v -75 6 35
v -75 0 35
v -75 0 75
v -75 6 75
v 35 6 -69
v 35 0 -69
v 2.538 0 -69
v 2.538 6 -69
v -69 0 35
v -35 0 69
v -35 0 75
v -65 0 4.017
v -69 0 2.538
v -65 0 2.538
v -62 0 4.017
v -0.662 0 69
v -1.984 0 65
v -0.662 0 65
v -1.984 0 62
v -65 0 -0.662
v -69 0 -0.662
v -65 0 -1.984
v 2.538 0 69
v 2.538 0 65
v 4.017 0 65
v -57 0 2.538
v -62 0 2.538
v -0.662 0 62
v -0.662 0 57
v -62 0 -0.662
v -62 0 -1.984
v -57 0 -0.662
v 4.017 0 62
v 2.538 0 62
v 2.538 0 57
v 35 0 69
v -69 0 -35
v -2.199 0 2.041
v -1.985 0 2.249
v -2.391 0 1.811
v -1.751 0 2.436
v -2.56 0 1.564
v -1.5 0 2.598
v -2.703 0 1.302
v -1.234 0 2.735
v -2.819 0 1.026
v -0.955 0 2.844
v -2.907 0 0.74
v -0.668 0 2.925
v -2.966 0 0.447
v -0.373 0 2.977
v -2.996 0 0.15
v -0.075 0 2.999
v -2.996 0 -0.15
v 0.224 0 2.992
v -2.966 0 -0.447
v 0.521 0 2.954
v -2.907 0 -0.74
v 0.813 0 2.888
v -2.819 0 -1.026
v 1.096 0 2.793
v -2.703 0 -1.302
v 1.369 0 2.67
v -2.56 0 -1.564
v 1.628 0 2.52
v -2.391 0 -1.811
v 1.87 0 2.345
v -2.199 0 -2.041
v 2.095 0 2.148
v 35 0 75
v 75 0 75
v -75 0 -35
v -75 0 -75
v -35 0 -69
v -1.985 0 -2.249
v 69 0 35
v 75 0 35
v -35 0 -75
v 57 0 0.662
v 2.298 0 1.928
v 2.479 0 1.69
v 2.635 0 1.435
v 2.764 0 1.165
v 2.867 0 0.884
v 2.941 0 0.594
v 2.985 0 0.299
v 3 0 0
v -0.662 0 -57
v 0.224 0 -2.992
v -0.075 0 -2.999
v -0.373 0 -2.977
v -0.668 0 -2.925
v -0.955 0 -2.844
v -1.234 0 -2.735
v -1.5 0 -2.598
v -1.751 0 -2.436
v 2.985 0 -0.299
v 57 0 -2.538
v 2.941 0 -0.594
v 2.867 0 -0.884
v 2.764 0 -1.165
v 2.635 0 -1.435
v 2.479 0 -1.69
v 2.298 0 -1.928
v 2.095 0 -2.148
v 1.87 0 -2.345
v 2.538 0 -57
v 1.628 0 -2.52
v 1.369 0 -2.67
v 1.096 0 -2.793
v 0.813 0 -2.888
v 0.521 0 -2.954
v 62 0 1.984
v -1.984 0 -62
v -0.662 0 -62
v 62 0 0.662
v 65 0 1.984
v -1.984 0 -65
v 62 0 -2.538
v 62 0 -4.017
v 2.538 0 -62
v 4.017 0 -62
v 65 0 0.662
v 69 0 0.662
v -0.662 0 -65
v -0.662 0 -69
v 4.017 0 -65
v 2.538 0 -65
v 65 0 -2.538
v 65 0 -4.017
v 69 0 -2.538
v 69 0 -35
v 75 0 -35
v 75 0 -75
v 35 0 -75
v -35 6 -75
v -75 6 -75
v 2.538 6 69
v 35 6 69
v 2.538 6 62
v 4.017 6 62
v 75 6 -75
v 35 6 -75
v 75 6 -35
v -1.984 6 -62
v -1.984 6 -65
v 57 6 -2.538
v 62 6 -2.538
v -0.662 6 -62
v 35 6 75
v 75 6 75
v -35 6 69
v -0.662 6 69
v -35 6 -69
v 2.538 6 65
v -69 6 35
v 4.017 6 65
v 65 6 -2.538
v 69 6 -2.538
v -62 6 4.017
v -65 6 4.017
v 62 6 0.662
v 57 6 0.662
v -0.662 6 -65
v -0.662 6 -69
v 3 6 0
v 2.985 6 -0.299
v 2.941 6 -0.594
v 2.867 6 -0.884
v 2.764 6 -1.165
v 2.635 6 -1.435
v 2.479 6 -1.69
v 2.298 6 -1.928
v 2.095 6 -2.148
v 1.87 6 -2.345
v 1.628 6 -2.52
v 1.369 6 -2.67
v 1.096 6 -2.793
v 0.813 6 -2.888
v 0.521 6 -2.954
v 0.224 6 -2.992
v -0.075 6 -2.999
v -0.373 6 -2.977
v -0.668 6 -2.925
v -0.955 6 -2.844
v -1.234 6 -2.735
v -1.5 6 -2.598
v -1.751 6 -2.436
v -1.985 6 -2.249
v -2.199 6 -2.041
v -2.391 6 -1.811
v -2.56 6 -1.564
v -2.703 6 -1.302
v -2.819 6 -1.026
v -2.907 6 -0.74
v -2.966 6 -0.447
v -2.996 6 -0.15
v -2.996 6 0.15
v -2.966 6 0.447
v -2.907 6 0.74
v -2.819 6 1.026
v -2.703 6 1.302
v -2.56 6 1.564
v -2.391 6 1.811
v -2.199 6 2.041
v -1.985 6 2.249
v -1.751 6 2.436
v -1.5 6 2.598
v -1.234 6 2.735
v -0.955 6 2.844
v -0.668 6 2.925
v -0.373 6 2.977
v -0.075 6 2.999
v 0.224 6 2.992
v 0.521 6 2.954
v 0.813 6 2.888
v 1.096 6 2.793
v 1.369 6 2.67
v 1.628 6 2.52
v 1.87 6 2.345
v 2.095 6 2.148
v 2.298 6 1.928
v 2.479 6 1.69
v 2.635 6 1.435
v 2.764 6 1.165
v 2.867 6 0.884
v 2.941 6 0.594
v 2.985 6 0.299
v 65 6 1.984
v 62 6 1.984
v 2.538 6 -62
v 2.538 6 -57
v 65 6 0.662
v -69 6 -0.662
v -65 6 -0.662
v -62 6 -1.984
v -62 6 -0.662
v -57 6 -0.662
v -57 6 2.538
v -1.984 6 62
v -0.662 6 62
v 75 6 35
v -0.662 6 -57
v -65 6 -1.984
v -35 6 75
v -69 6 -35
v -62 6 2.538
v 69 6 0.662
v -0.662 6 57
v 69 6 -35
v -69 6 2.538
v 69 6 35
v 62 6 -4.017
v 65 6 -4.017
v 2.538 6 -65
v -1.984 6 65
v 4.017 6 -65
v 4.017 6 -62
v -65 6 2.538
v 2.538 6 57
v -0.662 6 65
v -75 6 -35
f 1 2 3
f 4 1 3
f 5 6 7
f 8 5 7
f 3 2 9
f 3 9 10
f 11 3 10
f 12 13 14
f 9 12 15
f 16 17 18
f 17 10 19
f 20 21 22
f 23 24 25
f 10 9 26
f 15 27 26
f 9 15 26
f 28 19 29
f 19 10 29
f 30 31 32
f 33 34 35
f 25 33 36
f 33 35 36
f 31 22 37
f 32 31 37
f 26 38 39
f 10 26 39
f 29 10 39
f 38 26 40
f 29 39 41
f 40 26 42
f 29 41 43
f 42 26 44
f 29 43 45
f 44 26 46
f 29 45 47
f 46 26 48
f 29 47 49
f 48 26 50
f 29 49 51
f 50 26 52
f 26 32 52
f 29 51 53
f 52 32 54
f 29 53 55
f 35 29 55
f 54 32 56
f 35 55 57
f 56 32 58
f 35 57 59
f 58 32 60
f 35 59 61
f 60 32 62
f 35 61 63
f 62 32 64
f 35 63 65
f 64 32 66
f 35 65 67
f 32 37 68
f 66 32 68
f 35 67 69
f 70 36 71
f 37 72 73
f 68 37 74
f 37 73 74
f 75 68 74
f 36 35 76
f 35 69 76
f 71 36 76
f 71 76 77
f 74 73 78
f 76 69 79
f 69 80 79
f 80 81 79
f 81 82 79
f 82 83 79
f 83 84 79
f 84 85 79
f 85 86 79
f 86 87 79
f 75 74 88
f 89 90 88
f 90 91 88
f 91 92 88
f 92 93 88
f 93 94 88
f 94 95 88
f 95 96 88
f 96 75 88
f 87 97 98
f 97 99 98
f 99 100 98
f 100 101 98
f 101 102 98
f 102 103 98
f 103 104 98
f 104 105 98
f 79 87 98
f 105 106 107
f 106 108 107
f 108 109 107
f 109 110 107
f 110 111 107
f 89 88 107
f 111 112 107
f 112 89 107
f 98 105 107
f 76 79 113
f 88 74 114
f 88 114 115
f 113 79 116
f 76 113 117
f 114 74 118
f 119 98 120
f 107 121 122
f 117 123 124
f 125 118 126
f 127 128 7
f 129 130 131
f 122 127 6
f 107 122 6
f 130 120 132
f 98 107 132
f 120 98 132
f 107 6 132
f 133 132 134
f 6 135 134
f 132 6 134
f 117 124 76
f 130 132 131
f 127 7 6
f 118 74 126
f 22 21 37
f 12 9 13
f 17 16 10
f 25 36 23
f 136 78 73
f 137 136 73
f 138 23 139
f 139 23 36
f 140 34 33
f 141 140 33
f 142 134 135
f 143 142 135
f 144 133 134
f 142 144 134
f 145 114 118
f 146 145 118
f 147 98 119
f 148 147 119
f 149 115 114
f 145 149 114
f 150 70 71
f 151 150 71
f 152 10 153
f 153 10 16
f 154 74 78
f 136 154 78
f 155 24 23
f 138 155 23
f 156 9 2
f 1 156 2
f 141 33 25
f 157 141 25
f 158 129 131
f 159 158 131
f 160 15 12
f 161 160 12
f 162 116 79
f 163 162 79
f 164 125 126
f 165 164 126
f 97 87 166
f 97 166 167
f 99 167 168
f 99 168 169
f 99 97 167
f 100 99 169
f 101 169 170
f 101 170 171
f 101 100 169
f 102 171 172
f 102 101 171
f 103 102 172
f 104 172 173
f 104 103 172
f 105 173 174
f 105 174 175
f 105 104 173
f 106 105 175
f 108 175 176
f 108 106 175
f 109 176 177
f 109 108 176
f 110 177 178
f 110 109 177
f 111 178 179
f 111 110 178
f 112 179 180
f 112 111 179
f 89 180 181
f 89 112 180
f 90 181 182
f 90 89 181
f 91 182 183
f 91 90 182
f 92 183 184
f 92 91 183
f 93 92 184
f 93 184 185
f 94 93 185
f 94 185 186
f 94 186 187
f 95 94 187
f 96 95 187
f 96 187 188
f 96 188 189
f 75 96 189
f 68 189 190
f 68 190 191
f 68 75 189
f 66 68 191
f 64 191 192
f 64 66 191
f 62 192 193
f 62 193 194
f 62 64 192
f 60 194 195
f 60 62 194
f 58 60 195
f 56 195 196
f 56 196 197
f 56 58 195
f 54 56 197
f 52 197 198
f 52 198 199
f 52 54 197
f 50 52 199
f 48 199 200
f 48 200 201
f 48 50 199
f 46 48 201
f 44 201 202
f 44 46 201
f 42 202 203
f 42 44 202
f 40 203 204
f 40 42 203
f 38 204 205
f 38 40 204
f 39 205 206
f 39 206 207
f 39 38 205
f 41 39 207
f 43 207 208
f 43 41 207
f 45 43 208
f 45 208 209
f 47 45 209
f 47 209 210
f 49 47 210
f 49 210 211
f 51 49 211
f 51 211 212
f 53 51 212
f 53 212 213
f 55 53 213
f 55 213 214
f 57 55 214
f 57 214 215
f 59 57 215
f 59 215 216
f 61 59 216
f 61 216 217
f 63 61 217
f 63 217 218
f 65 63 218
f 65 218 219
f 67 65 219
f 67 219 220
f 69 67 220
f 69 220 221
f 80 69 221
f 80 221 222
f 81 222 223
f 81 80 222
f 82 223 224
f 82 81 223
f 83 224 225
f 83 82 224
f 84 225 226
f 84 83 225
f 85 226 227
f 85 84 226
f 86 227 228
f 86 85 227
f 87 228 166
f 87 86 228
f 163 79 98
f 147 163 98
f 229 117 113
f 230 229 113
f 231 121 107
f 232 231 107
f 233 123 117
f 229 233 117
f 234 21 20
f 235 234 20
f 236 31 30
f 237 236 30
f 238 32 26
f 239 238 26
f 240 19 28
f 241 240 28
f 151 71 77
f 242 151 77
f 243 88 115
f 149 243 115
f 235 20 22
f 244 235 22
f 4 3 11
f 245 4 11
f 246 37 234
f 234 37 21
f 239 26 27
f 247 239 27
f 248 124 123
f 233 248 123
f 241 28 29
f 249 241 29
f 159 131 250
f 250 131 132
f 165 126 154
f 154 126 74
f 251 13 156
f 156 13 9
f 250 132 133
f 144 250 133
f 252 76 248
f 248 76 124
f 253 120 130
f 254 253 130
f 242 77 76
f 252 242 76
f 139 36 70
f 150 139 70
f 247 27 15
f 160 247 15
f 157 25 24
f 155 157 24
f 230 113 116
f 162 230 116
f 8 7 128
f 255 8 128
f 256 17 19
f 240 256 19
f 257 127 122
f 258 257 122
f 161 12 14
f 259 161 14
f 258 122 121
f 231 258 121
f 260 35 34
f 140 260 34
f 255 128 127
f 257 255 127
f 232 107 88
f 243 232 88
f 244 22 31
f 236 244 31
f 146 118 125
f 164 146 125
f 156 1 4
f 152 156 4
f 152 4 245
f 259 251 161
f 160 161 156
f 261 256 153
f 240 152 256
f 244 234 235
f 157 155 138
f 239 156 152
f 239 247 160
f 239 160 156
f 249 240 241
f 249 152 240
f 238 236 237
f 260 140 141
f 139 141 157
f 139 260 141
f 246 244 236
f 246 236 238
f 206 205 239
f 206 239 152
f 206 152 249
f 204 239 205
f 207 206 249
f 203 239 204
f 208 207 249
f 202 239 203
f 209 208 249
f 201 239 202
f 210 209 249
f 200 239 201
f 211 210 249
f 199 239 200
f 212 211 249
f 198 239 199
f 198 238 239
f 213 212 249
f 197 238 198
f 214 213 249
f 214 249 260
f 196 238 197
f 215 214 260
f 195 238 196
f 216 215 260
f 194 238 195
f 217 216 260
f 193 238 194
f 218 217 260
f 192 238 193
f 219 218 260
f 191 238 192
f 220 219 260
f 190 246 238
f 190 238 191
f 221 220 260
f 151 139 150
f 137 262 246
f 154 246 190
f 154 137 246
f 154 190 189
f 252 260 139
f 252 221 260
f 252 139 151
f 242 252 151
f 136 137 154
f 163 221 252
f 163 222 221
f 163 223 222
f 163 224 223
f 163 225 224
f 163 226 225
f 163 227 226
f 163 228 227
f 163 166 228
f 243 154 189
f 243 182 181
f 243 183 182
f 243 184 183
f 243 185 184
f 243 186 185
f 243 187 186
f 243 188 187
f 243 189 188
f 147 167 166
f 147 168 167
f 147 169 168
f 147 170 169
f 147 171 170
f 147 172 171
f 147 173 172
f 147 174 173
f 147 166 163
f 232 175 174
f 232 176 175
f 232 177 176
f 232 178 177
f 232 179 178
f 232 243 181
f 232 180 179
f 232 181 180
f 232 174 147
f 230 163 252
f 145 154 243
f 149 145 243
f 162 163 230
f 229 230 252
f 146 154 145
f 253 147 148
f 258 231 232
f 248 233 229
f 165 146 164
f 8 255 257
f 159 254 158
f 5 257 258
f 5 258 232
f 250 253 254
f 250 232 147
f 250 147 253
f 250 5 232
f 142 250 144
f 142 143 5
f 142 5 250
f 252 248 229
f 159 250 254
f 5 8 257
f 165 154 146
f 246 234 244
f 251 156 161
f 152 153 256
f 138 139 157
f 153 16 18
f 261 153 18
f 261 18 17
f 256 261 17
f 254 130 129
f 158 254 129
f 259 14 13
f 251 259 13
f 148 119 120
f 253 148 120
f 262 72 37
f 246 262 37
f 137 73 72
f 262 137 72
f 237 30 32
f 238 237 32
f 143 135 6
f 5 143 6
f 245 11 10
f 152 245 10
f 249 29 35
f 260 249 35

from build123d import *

# Parameters (mm, degrees)
SKETCH1_R           = 3
BOSS_EXTRUDE1_DEPTH = 6


with BuildPart() as part:
    # Sketch1 → Boss-Extrude1 (new body)
    with BuildSketch(Plane(origin=(0, 0, 0), x_dir=(1, 0, 0), z_dir=(0, 1, 0))):
        Polygon((75, -35), (69, -35), (69, -0.661610306), (65, -0.661610306), (65, -1.98375967), (62, -1.98375967), (62, -0.661610306), (57, -0.661610306), (57, 2.538389694), (62, 2.538389694), (62, 4.016764367), (65, 4.016764367), (65, 2.538389694), (69, 2.538389694), (69, 35), (75, 35), (75, 75), (35, 75), (35, 69), (2.538389694, 69), (2.538389694, 65), (4.016764367, 65), (4.016764367, 62), (2.538389694, 62), (2.538389694, 57), (-0.661610306, 57), (-0.661610306, 62), (-1.98375967, 62), (-1.98375967, 65), (-0.661610306, 65), (-0.661610306, 69), (-35, 69), (-35, 75), (-75, 75), (-75, 35), (-69, 35), (-69, 0.661610306), (-65, 0.661610306), (-65, 1.98375967), (-62, 1.98375967), (-62, 0.661610306), (-57, 0.661610306), (-57, -2.538389694), (-62, -2.538389694), (-62, -4.016764367), (-65, -4.016764367), (-65, -2.538389694), (-69, -2.538389694), (-69, -35), (-75, -35), (-75, -75), (-35, -75), (-35, -69), (-0.661610306, -69), (-0.661610306, -65), (-1.98375967, -65), (-1.98375967, -62), (-0.661610306, -62), (-0.661610306, -57), (2.538389694, -57), (2.538389694, -62), (4.016764367, -62), (4.016764367, -65), (2.538389694, -65), (2.538389694, -69), (35, -69), (35, -75), (75, -75), align=None)
        Circle(SKETCH1_R, mode=Mode.SUBTRACT)
    extrude(amount=BOSS_EXTRUDE1_DEPTH)


solid = part.part
